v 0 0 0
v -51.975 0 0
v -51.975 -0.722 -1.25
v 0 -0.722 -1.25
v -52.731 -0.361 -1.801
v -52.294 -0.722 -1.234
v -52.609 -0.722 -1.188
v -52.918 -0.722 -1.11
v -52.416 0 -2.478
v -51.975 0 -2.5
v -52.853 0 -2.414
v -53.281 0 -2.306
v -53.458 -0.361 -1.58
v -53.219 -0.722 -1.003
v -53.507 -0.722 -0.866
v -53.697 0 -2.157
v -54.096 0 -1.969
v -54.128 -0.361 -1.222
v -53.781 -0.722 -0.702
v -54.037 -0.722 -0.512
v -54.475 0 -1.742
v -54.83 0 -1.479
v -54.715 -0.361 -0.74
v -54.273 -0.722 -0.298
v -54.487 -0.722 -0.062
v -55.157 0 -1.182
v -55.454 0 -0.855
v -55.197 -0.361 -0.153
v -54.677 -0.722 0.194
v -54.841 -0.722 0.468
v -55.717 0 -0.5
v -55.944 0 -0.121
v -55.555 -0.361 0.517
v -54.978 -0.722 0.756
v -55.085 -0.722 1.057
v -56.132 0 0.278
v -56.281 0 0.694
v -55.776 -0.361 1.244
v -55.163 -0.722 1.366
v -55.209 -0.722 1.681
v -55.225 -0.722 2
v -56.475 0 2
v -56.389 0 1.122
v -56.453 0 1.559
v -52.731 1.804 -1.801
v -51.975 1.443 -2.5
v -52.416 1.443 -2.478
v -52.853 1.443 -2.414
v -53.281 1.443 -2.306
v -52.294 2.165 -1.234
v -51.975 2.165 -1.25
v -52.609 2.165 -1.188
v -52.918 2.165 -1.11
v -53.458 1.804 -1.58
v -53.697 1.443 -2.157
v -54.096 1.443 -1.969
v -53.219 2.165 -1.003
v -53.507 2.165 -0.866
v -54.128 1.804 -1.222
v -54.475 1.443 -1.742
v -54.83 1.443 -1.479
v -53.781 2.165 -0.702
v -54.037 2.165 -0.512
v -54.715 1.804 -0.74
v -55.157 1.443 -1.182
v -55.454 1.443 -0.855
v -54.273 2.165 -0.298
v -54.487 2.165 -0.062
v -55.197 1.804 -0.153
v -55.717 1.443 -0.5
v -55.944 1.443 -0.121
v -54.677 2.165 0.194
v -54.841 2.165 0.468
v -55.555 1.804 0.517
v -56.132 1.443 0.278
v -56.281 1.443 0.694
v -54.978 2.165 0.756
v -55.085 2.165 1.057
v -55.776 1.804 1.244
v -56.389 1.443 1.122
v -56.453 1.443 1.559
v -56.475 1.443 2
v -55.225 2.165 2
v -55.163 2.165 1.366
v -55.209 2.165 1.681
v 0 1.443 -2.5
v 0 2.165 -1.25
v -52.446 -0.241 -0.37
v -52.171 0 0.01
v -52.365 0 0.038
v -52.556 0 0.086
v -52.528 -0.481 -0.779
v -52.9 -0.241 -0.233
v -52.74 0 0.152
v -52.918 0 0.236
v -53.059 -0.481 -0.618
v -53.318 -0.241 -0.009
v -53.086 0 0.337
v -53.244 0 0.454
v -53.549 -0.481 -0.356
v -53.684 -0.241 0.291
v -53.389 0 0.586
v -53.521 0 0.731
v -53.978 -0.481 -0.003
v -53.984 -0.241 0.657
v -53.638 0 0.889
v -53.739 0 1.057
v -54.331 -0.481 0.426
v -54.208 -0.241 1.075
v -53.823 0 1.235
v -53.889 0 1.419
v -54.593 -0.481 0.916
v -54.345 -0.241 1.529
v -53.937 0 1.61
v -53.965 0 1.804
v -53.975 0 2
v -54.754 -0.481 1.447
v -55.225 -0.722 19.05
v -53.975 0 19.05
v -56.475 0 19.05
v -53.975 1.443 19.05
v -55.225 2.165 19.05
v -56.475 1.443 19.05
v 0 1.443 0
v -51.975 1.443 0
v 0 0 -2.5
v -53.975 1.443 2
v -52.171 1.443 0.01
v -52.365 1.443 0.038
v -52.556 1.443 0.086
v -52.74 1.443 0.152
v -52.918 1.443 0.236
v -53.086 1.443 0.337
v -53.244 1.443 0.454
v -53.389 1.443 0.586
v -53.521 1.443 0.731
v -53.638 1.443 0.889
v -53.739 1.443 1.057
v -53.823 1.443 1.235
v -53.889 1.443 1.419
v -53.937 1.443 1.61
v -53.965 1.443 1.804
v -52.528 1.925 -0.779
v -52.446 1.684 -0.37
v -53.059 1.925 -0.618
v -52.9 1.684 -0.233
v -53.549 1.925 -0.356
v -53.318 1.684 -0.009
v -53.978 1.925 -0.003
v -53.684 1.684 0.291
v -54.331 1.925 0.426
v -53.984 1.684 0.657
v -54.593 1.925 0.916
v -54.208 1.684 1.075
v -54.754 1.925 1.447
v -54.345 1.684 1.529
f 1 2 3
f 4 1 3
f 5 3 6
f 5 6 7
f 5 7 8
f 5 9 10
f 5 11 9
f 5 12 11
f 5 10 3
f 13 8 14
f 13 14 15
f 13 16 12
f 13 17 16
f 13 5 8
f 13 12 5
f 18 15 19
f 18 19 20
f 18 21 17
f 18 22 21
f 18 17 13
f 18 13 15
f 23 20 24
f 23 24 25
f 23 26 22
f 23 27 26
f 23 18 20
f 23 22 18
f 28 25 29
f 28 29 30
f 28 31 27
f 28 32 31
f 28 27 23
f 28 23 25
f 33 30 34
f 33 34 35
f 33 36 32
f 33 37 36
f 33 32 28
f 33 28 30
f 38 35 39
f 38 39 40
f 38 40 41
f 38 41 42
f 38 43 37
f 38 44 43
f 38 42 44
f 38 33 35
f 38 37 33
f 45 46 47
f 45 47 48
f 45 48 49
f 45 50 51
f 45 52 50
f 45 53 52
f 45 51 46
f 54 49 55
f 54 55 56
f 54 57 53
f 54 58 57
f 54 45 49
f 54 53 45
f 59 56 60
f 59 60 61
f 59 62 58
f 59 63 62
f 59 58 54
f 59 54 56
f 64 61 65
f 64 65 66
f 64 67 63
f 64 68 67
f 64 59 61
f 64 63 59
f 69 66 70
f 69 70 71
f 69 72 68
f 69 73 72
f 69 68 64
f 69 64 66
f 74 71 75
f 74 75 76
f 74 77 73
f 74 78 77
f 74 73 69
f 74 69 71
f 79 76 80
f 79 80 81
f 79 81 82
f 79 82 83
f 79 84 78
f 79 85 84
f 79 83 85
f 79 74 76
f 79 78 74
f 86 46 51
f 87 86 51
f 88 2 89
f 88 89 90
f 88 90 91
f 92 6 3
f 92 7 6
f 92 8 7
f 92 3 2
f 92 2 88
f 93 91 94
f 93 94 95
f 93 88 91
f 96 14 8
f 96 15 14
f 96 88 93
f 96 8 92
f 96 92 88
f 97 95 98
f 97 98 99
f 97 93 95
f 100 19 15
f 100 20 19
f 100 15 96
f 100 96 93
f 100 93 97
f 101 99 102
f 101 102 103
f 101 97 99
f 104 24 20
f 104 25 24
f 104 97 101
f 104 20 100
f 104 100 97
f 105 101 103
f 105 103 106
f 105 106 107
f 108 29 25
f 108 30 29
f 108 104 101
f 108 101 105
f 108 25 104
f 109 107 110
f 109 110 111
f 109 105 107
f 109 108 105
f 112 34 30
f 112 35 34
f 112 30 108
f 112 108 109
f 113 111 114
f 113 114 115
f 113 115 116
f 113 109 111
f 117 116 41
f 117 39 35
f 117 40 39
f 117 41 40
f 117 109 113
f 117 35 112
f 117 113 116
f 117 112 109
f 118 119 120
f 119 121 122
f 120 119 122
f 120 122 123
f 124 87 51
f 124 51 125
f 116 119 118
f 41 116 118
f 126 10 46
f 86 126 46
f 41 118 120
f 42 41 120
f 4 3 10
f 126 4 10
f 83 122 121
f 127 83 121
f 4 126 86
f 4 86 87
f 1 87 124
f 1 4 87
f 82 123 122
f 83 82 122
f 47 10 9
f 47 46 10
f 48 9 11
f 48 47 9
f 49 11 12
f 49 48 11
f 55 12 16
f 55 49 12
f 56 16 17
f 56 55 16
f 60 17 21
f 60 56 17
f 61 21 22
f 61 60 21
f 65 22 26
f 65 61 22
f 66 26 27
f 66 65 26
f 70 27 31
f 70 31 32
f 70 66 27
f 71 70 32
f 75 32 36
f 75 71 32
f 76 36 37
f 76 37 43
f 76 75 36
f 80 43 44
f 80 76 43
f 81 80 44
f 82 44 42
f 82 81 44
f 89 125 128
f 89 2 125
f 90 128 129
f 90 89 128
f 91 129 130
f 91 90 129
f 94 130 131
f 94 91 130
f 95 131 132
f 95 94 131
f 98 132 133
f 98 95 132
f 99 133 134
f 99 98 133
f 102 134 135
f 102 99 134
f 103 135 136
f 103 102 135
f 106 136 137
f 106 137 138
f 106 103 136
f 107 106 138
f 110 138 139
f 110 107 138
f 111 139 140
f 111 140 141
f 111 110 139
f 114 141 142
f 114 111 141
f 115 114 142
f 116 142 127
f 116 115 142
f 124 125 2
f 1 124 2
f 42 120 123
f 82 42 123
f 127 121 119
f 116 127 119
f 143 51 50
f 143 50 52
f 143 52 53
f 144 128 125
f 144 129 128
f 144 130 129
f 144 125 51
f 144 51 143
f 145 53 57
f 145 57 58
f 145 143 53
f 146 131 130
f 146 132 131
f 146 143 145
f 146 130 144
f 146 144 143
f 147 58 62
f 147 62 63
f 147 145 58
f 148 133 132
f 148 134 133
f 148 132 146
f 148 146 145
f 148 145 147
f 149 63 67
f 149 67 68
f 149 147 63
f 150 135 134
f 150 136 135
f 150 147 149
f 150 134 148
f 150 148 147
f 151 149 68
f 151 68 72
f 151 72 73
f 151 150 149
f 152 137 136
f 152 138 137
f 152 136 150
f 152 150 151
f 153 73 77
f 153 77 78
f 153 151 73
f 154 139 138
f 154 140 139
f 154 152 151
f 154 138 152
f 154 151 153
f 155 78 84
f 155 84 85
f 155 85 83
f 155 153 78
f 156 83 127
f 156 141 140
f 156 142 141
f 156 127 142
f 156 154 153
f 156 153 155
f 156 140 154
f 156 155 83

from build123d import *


with BuildPart() as part:
    # Sweep1: sweep along a path in Sketch1
    with BuildLine(Plane(origin=(0, 0, 0), x_dir=(1, 0, 0), z_dir=(0, 1, 0))) as sweep1_path:
        Line((0, 0), (-51.975, 0))
        ThreePointArc((-51.975, 0), (-53.389213562, -0.585786438), (-53.975, -2))
        Line((-53.975, -2), (-53.975, -19.05))
    # Sketch2 → Sweep1 (sweep)
    with BuildSketch(Plane(origin=(0, 0, 0), x_dir=(0, 0, -1), z_dir=(1, 0, 0))):
        Polygon((1.25, -0.721687836), (2.5, 0), (2.5, 1.443375673), (1.25, 2.165063509), (0, 1.443375673), (0, 0), align=None)
    sweep(path=sweep1_path.line)


solid = part.part
